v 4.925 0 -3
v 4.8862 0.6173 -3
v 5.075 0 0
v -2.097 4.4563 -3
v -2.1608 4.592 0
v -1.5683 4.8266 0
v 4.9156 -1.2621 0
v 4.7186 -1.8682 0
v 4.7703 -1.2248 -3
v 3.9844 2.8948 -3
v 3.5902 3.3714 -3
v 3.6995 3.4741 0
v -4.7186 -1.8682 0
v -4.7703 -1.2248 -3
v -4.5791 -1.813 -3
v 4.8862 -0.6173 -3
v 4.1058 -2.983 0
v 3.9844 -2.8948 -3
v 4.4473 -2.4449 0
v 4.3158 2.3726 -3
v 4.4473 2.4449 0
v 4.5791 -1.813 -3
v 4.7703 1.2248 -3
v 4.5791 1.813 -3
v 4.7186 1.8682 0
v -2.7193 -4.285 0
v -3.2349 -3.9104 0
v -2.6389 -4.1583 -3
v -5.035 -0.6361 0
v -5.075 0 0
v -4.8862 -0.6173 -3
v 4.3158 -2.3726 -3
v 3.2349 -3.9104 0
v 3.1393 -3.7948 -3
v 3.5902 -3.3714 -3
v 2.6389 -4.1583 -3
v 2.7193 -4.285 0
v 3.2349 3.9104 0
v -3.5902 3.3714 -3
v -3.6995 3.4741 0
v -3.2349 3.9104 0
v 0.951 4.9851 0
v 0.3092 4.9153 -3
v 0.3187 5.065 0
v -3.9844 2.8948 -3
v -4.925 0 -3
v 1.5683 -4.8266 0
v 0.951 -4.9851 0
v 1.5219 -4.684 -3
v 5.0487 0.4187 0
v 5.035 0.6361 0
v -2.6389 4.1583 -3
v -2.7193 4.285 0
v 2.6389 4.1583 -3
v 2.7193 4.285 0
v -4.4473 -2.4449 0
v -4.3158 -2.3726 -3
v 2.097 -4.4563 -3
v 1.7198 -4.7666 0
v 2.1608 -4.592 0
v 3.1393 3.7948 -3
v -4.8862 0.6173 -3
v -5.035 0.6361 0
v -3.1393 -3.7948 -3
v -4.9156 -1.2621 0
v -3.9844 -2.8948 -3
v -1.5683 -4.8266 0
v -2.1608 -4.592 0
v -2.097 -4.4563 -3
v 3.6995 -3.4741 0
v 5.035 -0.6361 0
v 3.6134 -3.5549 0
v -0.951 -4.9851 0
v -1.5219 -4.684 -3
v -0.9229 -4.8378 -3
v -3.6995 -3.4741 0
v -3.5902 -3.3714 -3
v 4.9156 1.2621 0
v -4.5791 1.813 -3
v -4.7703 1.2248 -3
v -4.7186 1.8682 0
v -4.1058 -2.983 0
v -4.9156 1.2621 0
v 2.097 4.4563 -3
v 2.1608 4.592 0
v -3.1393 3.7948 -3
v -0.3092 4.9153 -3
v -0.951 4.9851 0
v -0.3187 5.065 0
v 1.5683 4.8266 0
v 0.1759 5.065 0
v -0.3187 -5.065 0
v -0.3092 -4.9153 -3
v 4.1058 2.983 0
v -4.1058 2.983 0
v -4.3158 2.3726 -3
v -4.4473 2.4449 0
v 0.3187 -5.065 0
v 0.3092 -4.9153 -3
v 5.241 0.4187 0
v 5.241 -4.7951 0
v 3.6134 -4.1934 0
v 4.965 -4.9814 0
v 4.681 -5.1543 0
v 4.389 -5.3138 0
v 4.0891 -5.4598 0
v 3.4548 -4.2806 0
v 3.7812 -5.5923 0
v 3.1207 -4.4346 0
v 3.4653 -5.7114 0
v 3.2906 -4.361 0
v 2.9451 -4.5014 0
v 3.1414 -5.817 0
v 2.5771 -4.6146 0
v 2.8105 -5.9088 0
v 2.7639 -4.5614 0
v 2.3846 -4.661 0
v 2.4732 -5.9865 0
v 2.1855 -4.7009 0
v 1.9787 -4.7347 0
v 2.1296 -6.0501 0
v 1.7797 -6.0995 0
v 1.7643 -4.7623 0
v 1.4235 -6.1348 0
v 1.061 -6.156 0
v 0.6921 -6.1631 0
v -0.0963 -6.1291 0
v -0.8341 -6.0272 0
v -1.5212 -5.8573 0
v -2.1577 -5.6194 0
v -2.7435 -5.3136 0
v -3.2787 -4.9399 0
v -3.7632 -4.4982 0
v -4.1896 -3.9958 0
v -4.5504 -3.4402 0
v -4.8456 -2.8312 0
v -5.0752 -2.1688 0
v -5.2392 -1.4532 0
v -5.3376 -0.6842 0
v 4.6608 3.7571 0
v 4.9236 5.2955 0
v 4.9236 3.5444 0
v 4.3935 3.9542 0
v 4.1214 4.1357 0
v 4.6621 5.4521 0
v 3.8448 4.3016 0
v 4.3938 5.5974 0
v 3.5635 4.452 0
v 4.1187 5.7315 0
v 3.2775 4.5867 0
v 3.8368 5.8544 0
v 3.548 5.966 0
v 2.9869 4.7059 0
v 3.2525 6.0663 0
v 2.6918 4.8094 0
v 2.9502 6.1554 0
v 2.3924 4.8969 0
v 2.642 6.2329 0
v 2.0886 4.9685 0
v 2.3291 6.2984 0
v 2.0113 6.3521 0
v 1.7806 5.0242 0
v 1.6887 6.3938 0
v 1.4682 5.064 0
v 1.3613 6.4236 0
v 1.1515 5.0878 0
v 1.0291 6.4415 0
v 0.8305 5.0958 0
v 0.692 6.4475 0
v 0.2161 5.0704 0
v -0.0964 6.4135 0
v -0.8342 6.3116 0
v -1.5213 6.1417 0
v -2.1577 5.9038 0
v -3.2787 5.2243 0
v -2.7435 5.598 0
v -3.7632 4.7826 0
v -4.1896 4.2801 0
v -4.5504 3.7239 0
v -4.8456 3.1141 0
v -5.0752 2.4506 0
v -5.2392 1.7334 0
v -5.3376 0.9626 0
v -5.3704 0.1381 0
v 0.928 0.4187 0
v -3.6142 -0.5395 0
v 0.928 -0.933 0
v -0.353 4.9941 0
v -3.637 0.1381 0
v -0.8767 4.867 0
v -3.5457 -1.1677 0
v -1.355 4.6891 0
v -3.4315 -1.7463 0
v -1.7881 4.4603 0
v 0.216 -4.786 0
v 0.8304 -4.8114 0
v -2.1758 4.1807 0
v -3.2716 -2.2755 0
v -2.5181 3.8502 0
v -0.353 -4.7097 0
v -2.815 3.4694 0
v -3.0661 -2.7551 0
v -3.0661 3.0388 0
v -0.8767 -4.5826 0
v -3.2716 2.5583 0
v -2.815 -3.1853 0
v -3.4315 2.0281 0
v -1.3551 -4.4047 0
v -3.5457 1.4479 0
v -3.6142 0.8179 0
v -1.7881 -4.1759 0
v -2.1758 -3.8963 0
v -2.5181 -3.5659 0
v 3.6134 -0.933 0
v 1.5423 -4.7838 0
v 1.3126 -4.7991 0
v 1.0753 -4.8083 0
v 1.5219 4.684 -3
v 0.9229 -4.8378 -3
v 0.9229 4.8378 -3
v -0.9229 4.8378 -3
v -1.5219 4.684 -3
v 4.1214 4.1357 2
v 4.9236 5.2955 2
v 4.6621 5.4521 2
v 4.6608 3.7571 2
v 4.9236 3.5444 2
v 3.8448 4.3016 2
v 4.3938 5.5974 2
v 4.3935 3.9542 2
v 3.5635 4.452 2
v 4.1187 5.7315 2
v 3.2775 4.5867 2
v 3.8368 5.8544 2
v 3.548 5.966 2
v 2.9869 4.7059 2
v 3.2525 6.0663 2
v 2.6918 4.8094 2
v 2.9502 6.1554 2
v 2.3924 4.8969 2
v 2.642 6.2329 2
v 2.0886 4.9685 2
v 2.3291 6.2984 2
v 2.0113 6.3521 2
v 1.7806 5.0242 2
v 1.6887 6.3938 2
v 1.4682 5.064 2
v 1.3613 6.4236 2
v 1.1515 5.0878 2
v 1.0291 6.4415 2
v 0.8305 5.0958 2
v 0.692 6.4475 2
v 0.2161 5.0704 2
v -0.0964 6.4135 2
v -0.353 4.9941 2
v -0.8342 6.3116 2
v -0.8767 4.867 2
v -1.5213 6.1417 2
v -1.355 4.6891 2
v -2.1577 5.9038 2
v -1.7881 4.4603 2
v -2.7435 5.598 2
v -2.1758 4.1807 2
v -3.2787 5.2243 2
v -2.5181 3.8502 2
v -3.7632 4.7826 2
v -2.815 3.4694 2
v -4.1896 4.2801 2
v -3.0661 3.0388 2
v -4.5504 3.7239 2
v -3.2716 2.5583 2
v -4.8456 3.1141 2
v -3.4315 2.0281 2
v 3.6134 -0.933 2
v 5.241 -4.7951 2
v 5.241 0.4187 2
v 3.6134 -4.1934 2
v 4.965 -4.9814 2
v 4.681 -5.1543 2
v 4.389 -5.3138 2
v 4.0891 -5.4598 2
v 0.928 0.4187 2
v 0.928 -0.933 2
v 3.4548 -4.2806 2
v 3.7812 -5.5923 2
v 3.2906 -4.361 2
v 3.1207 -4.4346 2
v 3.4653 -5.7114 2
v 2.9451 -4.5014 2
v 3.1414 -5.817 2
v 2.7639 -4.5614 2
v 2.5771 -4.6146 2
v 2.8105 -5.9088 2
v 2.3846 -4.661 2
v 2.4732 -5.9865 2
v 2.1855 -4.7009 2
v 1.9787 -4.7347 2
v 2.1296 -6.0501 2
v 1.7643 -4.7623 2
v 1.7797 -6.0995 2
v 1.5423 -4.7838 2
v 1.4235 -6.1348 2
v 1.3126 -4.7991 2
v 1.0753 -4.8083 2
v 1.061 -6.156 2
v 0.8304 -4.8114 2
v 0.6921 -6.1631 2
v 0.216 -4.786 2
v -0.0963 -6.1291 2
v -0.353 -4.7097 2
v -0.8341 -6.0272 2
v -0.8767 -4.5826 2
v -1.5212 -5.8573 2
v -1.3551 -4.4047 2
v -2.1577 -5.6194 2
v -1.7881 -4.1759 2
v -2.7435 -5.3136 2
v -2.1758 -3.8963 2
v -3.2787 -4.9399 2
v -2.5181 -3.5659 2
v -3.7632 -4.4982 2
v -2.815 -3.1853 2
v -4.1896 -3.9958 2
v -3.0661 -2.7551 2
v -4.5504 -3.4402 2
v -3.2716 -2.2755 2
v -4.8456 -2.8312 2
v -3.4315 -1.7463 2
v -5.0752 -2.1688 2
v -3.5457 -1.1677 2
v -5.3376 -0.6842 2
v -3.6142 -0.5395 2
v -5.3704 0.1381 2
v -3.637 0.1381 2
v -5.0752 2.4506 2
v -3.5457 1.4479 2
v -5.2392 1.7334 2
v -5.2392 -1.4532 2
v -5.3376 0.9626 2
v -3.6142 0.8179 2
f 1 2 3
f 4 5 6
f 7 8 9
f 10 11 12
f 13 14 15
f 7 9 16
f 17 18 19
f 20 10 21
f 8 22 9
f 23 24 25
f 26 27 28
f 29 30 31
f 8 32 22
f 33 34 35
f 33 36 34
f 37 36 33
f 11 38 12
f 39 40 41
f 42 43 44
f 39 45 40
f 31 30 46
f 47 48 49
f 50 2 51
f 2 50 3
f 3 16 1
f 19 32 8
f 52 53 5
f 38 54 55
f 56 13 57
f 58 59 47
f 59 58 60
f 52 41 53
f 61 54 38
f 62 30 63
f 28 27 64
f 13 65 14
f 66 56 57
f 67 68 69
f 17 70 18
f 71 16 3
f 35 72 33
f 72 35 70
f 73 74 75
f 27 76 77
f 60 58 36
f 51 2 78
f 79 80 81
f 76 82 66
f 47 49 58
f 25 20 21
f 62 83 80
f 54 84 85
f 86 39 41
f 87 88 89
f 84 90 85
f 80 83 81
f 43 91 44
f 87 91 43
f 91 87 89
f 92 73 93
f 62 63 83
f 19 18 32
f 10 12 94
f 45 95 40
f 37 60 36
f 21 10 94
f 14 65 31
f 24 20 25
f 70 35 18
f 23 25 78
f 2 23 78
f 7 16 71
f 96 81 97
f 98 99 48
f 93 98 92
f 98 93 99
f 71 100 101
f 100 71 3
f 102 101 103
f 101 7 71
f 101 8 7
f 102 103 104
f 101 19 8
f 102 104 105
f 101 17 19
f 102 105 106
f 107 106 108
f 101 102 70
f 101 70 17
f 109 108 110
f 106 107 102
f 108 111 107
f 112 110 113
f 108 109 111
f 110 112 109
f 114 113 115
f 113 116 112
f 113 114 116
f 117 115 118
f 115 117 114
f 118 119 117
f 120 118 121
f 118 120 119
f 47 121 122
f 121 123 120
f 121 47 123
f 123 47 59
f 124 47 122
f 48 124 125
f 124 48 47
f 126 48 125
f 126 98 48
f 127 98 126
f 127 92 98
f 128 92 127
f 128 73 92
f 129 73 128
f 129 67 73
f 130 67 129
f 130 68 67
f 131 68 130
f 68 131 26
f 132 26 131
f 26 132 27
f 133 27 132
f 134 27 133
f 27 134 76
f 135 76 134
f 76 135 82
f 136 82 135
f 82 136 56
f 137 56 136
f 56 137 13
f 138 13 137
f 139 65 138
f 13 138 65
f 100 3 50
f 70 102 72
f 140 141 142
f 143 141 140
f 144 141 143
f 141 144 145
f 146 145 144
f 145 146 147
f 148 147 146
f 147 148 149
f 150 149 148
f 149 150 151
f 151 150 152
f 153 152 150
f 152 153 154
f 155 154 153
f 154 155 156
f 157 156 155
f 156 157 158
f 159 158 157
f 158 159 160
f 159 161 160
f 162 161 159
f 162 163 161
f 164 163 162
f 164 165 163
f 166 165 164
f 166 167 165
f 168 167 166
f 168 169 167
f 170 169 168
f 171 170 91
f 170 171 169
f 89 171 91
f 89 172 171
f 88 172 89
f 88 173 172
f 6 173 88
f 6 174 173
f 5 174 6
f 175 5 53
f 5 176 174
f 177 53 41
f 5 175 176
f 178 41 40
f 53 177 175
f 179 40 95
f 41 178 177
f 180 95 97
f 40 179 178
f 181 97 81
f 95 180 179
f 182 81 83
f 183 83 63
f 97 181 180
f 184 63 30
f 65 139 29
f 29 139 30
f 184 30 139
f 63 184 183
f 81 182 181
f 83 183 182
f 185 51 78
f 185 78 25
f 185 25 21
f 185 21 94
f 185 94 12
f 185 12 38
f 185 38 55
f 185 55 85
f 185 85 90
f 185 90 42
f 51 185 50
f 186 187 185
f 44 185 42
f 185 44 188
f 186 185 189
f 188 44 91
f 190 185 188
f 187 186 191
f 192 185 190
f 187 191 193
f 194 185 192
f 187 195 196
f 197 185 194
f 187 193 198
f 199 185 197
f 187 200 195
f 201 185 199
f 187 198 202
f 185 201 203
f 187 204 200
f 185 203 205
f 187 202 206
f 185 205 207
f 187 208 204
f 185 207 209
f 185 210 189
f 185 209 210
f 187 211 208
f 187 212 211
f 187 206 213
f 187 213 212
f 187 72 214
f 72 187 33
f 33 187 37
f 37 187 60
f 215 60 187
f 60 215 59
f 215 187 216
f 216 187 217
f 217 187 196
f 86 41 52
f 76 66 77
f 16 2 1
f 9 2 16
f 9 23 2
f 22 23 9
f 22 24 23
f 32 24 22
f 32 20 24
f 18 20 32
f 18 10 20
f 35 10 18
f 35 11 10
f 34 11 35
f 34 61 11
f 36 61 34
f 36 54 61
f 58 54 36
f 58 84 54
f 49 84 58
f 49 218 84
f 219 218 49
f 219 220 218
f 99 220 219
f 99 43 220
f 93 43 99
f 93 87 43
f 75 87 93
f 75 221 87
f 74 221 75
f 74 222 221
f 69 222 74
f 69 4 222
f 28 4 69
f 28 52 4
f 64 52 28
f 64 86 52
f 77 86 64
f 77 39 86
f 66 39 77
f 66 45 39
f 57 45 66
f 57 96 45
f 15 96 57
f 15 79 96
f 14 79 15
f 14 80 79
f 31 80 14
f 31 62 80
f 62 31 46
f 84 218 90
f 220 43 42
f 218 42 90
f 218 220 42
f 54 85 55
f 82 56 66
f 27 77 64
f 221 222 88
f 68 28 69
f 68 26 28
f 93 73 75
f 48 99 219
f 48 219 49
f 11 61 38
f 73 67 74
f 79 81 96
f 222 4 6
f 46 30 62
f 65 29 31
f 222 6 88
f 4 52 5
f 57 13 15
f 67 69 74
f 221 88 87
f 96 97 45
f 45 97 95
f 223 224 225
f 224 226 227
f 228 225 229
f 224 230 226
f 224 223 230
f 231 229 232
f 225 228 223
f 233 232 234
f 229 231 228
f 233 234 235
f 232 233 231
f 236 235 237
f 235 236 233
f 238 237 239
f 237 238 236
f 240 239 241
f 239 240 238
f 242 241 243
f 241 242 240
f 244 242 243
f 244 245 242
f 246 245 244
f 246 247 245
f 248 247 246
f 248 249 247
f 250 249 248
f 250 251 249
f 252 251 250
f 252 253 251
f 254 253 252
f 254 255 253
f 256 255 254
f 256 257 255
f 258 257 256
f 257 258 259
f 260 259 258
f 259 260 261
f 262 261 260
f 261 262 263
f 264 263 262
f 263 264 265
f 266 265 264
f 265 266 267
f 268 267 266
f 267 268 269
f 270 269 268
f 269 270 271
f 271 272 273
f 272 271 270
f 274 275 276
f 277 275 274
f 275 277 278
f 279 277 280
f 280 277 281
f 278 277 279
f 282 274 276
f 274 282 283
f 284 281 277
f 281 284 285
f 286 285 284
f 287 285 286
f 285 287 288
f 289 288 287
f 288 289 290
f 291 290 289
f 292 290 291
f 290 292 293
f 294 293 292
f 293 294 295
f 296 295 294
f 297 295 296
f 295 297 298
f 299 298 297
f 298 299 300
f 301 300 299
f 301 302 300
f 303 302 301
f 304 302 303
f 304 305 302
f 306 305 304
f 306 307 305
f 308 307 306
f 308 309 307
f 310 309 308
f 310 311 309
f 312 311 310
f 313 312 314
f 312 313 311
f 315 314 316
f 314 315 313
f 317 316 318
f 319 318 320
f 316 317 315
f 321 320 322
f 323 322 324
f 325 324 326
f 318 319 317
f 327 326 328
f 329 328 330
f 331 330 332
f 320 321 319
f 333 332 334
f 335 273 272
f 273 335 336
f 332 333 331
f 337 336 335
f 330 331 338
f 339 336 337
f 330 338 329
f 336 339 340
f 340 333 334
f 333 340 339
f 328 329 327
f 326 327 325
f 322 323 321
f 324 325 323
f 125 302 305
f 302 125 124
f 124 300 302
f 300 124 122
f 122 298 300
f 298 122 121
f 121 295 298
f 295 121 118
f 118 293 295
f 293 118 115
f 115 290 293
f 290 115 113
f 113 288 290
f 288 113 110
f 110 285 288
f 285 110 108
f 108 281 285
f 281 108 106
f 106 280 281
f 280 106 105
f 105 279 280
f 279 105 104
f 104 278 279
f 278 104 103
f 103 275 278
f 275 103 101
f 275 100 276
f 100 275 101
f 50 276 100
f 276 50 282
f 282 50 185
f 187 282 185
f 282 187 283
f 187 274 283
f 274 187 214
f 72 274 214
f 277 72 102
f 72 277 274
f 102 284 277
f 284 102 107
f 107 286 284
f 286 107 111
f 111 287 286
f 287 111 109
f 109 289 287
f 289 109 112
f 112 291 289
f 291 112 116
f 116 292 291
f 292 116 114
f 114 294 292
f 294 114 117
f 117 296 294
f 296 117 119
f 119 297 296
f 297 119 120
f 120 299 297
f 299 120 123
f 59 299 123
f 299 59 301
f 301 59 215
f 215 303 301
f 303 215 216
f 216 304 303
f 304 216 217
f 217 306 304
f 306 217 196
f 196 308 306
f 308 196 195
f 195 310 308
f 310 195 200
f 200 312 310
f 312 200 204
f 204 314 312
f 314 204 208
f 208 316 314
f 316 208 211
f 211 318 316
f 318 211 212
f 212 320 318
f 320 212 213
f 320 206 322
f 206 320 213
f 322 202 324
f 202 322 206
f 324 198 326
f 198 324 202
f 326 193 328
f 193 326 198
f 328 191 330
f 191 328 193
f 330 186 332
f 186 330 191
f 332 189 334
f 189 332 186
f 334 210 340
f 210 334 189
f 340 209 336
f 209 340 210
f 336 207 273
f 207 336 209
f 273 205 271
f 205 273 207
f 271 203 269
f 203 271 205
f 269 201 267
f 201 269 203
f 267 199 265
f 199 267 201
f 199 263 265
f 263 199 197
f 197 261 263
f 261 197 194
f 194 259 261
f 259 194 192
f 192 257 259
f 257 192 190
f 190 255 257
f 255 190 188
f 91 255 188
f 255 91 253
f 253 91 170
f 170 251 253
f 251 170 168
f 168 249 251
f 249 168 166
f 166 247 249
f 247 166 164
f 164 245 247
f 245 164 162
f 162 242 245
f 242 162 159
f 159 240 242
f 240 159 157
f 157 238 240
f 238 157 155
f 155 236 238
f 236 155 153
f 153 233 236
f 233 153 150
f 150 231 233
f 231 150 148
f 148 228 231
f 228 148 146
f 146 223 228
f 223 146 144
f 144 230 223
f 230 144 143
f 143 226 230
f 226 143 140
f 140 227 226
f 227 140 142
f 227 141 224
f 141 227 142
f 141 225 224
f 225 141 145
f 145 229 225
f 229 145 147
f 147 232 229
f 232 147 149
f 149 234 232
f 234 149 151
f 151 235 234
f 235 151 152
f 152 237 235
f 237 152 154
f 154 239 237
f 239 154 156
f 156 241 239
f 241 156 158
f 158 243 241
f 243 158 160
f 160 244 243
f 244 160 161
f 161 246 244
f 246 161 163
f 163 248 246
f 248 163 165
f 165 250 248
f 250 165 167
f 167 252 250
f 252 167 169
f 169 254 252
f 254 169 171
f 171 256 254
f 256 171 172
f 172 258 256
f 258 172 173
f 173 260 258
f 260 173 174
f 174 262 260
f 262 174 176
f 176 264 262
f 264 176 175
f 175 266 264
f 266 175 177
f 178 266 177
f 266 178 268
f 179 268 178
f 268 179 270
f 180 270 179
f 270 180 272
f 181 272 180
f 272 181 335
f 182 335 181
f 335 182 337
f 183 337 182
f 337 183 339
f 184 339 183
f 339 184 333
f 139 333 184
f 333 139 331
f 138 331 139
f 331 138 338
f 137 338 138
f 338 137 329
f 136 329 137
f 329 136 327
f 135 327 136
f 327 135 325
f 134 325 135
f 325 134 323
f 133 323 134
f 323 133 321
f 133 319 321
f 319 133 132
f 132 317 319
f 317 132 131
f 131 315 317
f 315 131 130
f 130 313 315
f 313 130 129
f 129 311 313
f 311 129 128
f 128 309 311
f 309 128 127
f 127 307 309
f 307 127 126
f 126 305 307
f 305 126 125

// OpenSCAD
$fn = 50;


difference() {
	union() {
		translate(v = [0, 0, -3.0000000000]) {
			cylinder(h = 3, r1 = 4.9250000000, r2 = 5.0750000000);
		}
		linear_extrude(height = 2) {
			text(font = "Impact", halign = "center", size = 12, text = "G", valign = "center");
		}
	}
	union();
}
